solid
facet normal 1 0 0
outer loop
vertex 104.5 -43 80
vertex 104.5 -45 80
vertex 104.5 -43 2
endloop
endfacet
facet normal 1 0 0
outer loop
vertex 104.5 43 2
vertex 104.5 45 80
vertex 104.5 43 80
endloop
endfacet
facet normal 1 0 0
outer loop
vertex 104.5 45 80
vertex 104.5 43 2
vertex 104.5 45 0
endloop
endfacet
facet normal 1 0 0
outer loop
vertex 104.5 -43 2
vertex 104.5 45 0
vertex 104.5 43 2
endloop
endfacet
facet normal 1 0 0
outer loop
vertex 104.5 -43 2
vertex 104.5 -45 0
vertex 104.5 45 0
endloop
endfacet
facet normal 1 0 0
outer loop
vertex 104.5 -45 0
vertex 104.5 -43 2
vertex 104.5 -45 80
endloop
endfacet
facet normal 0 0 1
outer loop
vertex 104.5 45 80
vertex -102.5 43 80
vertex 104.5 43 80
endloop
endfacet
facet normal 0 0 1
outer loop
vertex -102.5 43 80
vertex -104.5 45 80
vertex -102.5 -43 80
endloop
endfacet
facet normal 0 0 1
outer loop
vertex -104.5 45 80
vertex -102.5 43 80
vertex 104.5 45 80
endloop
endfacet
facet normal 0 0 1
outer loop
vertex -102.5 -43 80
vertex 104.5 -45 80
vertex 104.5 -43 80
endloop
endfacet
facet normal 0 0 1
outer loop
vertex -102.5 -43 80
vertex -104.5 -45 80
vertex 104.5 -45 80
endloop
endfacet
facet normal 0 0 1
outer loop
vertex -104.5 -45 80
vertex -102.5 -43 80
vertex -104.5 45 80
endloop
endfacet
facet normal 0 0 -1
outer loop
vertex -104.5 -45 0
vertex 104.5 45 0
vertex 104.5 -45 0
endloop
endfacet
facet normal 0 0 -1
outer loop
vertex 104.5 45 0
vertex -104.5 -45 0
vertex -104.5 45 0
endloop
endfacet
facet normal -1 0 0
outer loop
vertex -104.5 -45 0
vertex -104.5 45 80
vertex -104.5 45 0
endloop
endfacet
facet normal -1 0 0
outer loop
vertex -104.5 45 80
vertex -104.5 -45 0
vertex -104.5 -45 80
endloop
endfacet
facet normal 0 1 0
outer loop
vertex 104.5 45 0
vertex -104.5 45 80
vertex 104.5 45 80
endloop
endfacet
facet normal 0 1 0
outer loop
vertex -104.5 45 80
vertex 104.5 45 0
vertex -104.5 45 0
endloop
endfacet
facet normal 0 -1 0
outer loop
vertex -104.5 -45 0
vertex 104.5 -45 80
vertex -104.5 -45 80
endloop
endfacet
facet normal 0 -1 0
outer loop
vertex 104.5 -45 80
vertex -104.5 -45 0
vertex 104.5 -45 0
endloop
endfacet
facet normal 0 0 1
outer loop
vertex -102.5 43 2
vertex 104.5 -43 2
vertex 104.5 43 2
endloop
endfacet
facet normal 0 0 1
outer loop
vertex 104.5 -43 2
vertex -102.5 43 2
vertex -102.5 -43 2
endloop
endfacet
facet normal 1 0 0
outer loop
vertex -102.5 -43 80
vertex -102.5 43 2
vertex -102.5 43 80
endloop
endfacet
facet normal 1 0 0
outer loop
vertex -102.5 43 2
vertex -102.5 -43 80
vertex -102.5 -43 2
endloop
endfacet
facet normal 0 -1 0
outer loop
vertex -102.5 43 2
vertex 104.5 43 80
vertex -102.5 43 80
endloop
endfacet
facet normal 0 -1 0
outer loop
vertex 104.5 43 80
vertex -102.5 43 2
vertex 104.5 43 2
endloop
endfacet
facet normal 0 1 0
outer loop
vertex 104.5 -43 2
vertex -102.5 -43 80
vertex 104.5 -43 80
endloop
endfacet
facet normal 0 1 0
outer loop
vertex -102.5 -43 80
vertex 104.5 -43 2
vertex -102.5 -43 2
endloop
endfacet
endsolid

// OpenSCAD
use <write/Write.scad>




ticket_laenge=200;
ticket_breite=81;

spatzig=5;
rand=2;

hoehe=80;

translate([-(ticket_laenge+spatzig+2*rand)/2,-(ticket_breite+spatzig+2*rand)/2,0]){
difference(){
cube([ticket_laenge+spatzig+2*rand,ticket_breite+spatzig+2*rand,hoehe]);

translate([rand,rand,rand])cube([ticket_laenge*2,ticket_breite+spatzig,hoehe]);
}
}



writecube("STAGE DAYS",[0,0,hoehe/2],[ticket_laenge+spatzig+2*rand,ticket_breite+spatzig+2*rand,hoehe],face="front",h=20); 

writecube("STAGE DAYS",[0,0,hoehe/2],[ticket_laenge+spatzig+2*rand,ticket_breite+spatzig+2*rand,hoehe],face="back",h=20); 
